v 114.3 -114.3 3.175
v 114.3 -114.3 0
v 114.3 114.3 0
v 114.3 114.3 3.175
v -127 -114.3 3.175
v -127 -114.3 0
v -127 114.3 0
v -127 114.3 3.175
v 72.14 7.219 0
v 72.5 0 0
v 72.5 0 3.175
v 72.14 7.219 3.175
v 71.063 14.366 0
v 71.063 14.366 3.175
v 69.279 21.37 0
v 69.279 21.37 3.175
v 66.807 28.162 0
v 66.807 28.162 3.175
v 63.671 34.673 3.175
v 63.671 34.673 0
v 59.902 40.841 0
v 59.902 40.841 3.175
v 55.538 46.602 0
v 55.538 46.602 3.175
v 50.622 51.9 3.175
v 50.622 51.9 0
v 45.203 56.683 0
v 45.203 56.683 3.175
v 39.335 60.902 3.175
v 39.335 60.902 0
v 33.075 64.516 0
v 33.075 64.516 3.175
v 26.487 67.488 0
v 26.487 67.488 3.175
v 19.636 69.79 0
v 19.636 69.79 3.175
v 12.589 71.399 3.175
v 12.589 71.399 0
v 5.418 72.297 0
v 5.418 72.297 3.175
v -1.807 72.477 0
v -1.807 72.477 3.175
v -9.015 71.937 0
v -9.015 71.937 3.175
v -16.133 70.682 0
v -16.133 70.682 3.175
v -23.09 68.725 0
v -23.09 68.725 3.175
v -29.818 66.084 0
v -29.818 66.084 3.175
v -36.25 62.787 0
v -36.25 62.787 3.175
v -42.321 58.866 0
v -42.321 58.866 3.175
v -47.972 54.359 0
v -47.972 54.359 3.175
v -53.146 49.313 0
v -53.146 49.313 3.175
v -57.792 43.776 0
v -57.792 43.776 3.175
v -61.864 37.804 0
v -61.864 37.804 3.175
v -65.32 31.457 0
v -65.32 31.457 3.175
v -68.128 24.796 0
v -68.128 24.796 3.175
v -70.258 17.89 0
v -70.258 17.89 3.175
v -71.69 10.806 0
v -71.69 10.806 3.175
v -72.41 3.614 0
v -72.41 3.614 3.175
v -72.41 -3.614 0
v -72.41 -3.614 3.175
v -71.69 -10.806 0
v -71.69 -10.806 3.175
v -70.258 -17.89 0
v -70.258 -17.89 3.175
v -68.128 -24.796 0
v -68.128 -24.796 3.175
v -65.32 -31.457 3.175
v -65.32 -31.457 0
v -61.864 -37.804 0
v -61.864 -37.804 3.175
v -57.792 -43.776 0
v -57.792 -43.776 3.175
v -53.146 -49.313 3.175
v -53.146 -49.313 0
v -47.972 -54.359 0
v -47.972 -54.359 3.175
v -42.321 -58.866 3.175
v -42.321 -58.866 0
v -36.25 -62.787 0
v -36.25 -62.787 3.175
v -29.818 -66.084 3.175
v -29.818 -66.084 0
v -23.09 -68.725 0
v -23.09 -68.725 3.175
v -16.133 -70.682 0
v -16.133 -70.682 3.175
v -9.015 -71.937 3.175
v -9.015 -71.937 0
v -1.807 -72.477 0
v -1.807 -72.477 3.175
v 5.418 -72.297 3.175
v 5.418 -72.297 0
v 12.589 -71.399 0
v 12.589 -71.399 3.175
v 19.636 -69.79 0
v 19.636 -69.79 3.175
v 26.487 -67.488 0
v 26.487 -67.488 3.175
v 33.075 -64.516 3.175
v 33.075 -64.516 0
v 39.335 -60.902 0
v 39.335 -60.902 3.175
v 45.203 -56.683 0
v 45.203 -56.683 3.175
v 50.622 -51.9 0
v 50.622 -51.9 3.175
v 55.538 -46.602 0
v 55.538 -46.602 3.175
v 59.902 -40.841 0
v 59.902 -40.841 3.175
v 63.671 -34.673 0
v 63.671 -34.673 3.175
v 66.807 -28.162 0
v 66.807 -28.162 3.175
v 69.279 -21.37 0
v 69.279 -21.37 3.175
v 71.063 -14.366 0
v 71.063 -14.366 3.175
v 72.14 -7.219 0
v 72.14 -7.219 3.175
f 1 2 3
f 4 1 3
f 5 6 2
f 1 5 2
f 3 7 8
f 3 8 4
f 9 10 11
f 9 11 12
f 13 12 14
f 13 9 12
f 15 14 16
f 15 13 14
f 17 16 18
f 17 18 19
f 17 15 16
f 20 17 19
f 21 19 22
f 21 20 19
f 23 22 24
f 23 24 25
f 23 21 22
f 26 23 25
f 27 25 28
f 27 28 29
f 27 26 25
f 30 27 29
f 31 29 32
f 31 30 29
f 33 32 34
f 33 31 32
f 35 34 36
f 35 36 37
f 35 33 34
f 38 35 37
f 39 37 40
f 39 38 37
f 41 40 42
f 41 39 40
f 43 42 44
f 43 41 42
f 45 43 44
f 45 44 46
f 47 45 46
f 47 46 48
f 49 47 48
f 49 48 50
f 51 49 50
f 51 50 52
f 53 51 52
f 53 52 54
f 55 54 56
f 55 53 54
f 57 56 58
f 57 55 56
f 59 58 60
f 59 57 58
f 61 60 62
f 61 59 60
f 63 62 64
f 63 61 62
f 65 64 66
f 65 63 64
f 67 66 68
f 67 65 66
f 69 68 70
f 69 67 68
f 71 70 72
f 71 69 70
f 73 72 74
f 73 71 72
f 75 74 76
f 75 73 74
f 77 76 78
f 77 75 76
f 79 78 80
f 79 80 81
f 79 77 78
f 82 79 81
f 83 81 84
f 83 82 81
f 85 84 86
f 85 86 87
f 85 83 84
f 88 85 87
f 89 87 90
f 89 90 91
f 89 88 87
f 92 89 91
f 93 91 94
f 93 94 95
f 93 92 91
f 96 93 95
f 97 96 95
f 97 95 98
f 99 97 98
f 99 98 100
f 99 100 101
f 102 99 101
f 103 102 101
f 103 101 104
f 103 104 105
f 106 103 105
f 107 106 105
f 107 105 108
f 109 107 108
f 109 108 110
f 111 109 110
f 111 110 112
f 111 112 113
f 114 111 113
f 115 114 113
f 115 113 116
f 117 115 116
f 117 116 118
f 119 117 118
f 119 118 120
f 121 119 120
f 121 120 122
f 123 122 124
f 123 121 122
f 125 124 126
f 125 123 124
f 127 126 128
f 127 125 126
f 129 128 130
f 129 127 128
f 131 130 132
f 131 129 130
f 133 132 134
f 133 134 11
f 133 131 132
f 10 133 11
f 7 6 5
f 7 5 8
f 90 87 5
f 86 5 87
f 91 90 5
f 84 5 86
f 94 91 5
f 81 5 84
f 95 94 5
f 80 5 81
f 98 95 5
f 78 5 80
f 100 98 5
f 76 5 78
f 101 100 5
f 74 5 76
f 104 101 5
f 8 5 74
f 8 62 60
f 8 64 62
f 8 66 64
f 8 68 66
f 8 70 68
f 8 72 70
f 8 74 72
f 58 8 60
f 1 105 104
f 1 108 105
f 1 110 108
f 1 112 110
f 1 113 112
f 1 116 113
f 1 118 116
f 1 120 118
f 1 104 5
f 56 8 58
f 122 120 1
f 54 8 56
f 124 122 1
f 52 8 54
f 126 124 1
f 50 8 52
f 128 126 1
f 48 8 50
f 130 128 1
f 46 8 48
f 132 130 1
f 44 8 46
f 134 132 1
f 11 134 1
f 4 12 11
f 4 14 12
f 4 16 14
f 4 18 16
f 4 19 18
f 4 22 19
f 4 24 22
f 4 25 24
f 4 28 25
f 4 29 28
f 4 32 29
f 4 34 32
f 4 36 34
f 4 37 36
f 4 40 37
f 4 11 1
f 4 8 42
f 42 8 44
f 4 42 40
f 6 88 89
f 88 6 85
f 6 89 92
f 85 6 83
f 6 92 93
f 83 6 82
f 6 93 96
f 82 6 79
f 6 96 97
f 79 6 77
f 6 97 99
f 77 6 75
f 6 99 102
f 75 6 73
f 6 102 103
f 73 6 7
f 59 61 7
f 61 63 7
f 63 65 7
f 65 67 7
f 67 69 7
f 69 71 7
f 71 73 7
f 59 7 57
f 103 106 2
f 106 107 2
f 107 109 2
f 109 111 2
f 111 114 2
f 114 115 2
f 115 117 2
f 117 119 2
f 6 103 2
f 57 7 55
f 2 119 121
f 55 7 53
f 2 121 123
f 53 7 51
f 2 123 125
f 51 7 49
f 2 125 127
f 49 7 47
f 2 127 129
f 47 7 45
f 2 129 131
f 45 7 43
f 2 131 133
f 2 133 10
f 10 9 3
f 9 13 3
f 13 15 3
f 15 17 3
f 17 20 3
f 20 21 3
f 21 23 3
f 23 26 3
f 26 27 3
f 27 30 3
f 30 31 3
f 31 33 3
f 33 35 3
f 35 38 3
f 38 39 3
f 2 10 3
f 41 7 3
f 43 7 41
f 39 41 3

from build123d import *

# Parameters (mm, degrees)
SKETCH2_W           = 241.3
SKETCH2_H           = 228.6
SKETCH2_R           = 100
SKETCH2_R_2         = 72.5
BOSS_EXTRUDE1_DEPTH = 3.175


with BuildPart() as part:
    # Sketch2 → Boss-Extrude1 (new body)
    # profile 1 of 2: a face of its own
    with BuildSketch(Plane.XY):
        with Locations((-6.35, 0)):
            Rectangle(SKETCH2_W, SKETCH2_H)
        Circle(SKETCH2_R, mode=Mode.SUBTRACT)
    # profile 2 of 2: a face of its own
    with BuildSketch(Plane.XY):
        Circle(SKETCH2_R)
        Circle(SKETCH2_R_2, mode=Mode.SUBTRACT)
    extrude(amount=BOSS_EXTRUDE1_DEPTH)


solid = part.part
